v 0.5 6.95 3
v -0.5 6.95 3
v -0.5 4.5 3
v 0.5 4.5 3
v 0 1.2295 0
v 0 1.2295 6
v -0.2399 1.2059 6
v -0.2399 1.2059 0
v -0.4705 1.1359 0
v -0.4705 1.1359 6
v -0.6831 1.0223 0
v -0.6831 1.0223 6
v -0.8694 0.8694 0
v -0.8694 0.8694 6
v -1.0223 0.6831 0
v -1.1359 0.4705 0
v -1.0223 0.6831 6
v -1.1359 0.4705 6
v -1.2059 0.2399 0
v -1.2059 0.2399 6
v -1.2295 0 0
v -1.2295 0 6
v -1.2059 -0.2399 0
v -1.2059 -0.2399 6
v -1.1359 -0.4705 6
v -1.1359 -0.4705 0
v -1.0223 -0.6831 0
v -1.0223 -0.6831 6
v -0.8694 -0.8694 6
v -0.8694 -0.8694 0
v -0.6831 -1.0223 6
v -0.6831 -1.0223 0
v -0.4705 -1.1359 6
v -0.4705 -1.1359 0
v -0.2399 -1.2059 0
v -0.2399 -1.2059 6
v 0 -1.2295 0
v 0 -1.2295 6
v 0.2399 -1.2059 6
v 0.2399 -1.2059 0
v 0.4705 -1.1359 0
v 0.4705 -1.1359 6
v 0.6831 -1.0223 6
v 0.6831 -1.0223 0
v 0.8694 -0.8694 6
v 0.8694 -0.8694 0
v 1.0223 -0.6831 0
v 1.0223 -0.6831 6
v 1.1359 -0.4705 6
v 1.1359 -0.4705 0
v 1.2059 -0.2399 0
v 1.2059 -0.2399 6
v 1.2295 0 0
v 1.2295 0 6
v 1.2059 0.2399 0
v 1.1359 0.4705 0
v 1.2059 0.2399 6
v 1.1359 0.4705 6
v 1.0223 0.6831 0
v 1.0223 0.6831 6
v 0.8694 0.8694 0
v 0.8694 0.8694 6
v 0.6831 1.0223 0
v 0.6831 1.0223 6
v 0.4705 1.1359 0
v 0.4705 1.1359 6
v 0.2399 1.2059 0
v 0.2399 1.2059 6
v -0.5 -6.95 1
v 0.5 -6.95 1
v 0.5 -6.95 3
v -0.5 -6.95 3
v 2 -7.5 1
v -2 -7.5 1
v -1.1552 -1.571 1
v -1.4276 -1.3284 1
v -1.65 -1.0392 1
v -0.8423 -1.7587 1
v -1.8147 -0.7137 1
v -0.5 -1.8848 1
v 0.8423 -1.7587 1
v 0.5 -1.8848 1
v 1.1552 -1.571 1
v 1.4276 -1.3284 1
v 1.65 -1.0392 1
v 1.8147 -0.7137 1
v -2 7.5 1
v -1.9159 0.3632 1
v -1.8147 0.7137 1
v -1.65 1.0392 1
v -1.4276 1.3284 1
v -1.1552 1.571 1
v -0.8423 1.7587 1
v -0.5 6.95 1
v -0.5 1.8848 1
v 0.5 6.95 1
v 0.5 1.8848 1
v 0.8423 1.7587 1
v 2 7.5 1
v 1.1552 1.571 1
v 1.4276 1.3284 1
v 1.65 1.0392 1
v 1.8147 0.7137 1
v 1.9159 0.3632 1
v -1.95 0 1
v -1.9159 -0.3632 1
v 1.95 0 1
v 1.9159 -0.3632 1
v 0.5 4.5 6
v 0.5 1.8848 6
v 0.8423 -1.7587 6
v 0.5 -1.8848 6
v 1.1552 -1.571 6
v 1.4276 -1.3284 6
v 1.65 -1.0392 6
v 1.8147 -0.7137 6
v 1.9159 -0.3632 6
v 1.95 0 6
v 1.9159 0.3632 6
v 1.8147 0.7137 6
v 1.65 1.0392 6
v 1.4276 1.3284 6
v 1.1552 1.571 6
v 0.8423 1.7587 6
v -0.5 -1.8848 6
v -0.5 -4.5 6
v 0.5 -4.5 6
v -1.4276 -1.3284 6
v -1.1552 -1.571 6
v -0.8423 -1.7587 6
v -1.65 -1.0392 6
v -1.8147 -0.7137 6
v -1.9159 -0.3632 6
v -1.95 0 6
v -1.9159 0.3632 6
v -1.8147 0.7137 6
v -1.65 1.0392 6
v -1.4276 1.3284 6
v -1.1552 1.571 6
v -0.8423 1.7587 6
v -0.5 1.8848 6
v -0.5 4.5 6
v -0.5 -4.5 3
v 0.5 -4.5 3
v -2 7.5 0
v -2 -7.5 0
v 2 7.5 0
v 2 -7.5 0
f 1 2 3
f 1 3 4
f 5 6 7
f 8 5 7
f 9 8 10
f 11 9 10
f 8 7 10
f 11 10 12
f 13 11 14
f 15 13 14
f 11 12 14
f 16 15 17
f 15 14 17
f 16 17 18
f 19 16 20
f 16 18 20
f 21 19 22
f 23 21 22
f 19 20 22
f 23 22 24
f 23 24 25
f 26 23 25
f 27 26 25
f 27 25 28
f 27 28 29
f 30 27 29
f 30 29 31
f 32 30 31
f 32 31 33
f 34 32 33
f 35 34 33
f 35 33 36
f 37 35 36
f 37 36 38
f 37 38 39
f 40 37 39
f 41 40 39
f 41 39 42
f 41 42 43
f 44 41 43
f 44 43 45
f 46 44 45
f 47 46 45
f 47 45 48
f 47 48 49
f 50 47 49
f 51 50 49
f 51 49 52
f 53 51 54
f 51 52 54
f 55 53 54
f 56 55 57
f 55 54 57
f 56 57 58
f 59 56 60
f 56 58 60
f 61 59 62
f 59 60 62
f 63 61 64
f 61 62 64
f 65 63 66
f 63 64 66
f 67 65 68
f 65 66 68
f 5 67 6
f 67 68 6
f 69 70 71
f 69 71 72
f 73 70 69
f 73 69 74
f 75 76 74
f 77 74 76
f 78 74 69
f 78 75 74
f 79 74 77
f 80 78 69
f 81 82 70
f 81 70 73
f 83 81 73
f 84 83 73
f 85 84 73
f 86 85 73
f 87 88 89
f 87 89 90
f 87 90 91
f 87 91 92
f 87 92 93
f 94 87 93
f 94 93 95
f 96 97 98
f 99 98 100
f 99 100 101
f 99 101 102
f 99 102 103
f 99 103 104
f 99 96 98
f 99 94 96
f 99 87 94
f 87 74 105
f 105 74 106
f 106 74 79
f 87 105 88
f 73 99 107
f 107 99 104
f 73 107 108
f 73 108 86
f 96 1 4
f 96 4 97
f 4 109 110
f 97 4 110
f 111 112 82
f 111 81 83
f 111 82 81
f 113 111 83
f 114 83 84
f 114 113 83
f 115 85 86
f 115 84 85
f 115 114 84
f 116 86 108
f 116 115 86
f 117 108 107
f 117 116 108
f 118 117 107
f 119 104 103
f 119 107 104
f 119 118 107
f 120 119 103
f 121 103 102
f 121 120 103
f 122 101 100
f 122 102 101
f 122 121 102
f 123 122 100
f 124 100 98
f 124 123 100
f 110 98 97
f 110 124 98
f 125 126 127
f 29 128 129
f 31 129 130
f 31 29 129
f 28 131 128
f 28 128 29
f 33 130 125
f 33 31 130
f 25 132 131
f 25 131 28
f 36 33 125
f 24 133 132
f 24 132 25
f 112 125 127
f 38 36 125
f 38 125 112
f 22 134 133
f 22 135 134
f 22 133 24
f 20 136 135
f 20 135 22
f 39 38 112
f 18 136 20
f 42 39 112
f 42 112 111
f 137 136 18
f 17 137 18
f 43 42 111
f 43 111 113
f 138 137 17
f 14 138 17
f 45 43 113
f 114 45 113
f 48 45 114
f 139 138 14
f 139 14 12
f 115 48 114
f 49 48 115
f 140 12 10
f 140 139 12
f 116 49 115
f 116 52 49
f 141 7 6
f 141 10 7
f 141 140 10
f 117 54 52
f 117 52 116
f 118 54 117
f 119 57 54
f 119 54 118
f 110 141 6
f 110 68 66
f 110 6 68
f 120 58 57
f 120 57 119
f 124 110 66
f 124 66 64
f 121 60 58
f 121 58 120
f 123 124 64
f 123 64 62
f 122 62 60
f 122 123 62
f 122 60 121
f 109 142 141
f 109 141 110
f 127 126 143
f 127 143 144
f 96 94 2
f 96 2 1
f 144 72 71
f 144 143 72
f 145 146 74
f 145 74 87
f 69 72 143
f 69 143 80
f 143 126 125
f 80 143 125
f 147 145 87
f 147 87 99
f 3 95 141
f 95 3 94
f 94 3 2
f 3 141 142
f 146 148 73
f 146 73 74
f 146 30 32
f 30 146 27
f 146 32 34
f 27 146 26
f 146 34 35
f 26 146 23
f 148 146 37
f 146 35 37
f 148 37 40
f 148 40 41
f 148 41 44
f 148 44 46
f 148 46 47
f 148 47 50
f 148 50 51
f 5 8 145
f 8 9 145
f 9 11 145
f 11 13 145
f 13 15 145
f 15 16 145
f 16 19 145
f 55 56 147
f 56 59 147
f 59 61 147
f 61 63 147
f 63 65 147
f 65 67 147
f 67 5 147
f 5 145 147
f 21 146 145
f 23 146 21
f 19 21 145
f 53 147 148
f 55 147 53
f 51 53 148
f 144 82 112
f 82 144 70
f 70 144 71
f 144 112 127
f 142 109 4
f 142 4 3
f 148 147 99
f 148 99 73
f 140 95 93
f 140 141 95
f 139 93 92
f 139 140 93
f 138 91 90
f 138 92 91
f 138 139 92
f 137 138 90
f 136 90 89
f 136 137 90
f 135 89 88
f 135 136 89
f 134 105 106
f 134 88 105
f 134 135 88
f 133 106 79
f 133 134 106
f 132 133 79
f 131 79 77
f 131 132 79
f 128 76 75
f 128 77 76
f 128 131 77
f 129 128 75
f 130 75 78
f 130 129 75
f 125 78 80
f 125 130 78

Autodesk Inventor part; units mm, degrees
ref_plane "YZ Plane" through (0, 0, 0) normal (1, 0, 0) x (0, 1, 0)
ref_plane "XZ Plane" through (0, 0, 0) normal (0, 1, 0) x (-1, 0, 0)
ref_plane "XY Plane" through (0, 0, 0) normal (0, 0, 1) x (1, 0, 0)
sketch "Esboço1" plane through (0, 0, 0) normal (0, 0, 1) x (1, 0, 0)
  line L0 (-2, 7.5) -> (2, 7.5)
  line L1 (2, 7.5) -> (2, -7.5)
  line L2 (2, -7.5) -> (-2, -7.5)
  line L3 (-2, -7.5) -> (-2, 7.5)
  line L4 (-2, 7.5) -> (2, -7.5) construction
  line L5 (2, 7.5) -> (-2, -7.5) construction
  point P0 (0, 0)
  dimension "d0" = 4
  dimension "d1" = 15
extrude "Extrusão1" add sketch "Esboço1" along normal blind 1
sketch "Esboço2" plane through (0, 0, 1) normal (0, 0, 1) x (1, 0, 0)
  line L0 (-1.95, 6.95) -> (1.95, 6.95)
  line L1 (1.95, 6.95) -> (1.95, -6.95)
  line L2 (1.95, -6.95) -> (-1.95, -6.95)
  line L3 (-1.95, -6.95) -> (-1.95, 6.95)
  line L4 (-1.95, 6.95) -> (1.95, -6.95) construction
  line L5 (1.95, 6.95) -> (-1.95, -6.95) construction
  point P0 (0, 0)
  dimension "d4" = 3.9
  dimension "d5" = 13.9
extrude "Extrusão2" add sketch "Esboço2" along normal blind 5
sketch "Esboço3" plane through (0, 0, 6) normal (0, 0, 1) x (1, 0, 0)
  circle A0 centre (0, 0) radius 1.95
  line L0 (1.95, -6.95) -> (-1.95, -6.95) projected
  line L1 (-0.5, 6.95) -> (0.5, 6.95)
  line L2 (0.5, 6.95) -> (0.5, -6.95)
  line L3 (0.5, -6.95) -> (-0.5, -6.95)
  line L4 (-0.5, -6.95) -> (-0.5, 6.95)
  line L5 (-0.5, 6.95) -> (0.5, -6.95) construction
  line L6 (0.5, 6.95) -> (-0.5, -6.95) construction
  line L7 (-1.95, 6.95) -> (1.95, 6.95)
  line L8 (1.95, 6.95) -> (1.95, -6.95)
  line L9 (1.95, -6.95) -> (-1.95, -6.95)
  line L10 (-1.95, -6.95) -> (-1.95, 6.95)
  line L11 (-1.95, 6.95) -> (1.95, -6.95) construction
  line L12 (1.95, 6.95) -> (-1.95, -6.95) construction
  point P0 (-1.95, 0)
  point P1 (-0.5, -1.8848)
  point P2 (-0.5, 1.8848)
  point P3 (1.95, 0)
  point P4 (0.5, 1.8848)
  point P5 (0.5, -1.8848)
  dimension "d8" = 3.9
  dimension "d9" = 1
extrude "Extrusão3" cut sketch "Esboço3" against normal blind 5 contours L8 L0 L2 A0 | A0 L2 L7 L8 | A0 L10 L7 L4 | L4 L0 L10 A0
sketch "Esboço4" plane through (0, 0, 6) normal (0, 0, 1) x (1, 0, 0)
  line L0 (-0.5, -4.5) -> (0.5, -4.5)
  line L1 (0.5, -4.5) -> (0.5, 4.5)
  line L2 (0.5, 4.5) -> (-0.5, 4.5)
  line L3 (-0.5, 4.5) -> (-0.5, -4.5)
  line L4 (-0.5, -4.5) -> (0.5, 4.5) construction
  line L5 (0.5, -4.5) -> (-0.5, 4.5) construction
  line L6 (0.5, 1.8848) -> (0.5, 6.95) projected
  line L7 (-0.5, -6.95) -> (0.5, -6.95)
  line L8 (0.5, -6.95) -> (0.5, 6.95)
  line L9 (0.5, 6.95) -> (-0.5, 6.95)
  line L10 (-0.5, 6.95) -> (-0.5, -6.95)
  line L11 (-0.5, -6.95) -> (0.5, 6.95) construction
  line L12 (0.5, -6.95) -> (-0.5, 6.95) construction
  point P0 (0, 0)
  dimension "d12" = 1
  dimension "d13" = 9
extrude "Extrusão4" cut sketch "Esboço4" against normal blind 3 contours L0 L8 L7 L10 | L10 L9 L6 L2
sketch "Esboço5" plane through (0, 0, 0) normal (0, 0, -1) x (-1, 0, 0)
  point P0 (0, 0)
  point P1 (0, 0)
  dimension "d23" = 0
  dimension "d24" = 0
hole "Furo1" at (0, 0, 0) direction (0, 0, 1) diameter 2.459 end through all thread size "M3x0.5" class "6H" standard "ANSI Metric M Profile"
properties part number "TRAVA"
